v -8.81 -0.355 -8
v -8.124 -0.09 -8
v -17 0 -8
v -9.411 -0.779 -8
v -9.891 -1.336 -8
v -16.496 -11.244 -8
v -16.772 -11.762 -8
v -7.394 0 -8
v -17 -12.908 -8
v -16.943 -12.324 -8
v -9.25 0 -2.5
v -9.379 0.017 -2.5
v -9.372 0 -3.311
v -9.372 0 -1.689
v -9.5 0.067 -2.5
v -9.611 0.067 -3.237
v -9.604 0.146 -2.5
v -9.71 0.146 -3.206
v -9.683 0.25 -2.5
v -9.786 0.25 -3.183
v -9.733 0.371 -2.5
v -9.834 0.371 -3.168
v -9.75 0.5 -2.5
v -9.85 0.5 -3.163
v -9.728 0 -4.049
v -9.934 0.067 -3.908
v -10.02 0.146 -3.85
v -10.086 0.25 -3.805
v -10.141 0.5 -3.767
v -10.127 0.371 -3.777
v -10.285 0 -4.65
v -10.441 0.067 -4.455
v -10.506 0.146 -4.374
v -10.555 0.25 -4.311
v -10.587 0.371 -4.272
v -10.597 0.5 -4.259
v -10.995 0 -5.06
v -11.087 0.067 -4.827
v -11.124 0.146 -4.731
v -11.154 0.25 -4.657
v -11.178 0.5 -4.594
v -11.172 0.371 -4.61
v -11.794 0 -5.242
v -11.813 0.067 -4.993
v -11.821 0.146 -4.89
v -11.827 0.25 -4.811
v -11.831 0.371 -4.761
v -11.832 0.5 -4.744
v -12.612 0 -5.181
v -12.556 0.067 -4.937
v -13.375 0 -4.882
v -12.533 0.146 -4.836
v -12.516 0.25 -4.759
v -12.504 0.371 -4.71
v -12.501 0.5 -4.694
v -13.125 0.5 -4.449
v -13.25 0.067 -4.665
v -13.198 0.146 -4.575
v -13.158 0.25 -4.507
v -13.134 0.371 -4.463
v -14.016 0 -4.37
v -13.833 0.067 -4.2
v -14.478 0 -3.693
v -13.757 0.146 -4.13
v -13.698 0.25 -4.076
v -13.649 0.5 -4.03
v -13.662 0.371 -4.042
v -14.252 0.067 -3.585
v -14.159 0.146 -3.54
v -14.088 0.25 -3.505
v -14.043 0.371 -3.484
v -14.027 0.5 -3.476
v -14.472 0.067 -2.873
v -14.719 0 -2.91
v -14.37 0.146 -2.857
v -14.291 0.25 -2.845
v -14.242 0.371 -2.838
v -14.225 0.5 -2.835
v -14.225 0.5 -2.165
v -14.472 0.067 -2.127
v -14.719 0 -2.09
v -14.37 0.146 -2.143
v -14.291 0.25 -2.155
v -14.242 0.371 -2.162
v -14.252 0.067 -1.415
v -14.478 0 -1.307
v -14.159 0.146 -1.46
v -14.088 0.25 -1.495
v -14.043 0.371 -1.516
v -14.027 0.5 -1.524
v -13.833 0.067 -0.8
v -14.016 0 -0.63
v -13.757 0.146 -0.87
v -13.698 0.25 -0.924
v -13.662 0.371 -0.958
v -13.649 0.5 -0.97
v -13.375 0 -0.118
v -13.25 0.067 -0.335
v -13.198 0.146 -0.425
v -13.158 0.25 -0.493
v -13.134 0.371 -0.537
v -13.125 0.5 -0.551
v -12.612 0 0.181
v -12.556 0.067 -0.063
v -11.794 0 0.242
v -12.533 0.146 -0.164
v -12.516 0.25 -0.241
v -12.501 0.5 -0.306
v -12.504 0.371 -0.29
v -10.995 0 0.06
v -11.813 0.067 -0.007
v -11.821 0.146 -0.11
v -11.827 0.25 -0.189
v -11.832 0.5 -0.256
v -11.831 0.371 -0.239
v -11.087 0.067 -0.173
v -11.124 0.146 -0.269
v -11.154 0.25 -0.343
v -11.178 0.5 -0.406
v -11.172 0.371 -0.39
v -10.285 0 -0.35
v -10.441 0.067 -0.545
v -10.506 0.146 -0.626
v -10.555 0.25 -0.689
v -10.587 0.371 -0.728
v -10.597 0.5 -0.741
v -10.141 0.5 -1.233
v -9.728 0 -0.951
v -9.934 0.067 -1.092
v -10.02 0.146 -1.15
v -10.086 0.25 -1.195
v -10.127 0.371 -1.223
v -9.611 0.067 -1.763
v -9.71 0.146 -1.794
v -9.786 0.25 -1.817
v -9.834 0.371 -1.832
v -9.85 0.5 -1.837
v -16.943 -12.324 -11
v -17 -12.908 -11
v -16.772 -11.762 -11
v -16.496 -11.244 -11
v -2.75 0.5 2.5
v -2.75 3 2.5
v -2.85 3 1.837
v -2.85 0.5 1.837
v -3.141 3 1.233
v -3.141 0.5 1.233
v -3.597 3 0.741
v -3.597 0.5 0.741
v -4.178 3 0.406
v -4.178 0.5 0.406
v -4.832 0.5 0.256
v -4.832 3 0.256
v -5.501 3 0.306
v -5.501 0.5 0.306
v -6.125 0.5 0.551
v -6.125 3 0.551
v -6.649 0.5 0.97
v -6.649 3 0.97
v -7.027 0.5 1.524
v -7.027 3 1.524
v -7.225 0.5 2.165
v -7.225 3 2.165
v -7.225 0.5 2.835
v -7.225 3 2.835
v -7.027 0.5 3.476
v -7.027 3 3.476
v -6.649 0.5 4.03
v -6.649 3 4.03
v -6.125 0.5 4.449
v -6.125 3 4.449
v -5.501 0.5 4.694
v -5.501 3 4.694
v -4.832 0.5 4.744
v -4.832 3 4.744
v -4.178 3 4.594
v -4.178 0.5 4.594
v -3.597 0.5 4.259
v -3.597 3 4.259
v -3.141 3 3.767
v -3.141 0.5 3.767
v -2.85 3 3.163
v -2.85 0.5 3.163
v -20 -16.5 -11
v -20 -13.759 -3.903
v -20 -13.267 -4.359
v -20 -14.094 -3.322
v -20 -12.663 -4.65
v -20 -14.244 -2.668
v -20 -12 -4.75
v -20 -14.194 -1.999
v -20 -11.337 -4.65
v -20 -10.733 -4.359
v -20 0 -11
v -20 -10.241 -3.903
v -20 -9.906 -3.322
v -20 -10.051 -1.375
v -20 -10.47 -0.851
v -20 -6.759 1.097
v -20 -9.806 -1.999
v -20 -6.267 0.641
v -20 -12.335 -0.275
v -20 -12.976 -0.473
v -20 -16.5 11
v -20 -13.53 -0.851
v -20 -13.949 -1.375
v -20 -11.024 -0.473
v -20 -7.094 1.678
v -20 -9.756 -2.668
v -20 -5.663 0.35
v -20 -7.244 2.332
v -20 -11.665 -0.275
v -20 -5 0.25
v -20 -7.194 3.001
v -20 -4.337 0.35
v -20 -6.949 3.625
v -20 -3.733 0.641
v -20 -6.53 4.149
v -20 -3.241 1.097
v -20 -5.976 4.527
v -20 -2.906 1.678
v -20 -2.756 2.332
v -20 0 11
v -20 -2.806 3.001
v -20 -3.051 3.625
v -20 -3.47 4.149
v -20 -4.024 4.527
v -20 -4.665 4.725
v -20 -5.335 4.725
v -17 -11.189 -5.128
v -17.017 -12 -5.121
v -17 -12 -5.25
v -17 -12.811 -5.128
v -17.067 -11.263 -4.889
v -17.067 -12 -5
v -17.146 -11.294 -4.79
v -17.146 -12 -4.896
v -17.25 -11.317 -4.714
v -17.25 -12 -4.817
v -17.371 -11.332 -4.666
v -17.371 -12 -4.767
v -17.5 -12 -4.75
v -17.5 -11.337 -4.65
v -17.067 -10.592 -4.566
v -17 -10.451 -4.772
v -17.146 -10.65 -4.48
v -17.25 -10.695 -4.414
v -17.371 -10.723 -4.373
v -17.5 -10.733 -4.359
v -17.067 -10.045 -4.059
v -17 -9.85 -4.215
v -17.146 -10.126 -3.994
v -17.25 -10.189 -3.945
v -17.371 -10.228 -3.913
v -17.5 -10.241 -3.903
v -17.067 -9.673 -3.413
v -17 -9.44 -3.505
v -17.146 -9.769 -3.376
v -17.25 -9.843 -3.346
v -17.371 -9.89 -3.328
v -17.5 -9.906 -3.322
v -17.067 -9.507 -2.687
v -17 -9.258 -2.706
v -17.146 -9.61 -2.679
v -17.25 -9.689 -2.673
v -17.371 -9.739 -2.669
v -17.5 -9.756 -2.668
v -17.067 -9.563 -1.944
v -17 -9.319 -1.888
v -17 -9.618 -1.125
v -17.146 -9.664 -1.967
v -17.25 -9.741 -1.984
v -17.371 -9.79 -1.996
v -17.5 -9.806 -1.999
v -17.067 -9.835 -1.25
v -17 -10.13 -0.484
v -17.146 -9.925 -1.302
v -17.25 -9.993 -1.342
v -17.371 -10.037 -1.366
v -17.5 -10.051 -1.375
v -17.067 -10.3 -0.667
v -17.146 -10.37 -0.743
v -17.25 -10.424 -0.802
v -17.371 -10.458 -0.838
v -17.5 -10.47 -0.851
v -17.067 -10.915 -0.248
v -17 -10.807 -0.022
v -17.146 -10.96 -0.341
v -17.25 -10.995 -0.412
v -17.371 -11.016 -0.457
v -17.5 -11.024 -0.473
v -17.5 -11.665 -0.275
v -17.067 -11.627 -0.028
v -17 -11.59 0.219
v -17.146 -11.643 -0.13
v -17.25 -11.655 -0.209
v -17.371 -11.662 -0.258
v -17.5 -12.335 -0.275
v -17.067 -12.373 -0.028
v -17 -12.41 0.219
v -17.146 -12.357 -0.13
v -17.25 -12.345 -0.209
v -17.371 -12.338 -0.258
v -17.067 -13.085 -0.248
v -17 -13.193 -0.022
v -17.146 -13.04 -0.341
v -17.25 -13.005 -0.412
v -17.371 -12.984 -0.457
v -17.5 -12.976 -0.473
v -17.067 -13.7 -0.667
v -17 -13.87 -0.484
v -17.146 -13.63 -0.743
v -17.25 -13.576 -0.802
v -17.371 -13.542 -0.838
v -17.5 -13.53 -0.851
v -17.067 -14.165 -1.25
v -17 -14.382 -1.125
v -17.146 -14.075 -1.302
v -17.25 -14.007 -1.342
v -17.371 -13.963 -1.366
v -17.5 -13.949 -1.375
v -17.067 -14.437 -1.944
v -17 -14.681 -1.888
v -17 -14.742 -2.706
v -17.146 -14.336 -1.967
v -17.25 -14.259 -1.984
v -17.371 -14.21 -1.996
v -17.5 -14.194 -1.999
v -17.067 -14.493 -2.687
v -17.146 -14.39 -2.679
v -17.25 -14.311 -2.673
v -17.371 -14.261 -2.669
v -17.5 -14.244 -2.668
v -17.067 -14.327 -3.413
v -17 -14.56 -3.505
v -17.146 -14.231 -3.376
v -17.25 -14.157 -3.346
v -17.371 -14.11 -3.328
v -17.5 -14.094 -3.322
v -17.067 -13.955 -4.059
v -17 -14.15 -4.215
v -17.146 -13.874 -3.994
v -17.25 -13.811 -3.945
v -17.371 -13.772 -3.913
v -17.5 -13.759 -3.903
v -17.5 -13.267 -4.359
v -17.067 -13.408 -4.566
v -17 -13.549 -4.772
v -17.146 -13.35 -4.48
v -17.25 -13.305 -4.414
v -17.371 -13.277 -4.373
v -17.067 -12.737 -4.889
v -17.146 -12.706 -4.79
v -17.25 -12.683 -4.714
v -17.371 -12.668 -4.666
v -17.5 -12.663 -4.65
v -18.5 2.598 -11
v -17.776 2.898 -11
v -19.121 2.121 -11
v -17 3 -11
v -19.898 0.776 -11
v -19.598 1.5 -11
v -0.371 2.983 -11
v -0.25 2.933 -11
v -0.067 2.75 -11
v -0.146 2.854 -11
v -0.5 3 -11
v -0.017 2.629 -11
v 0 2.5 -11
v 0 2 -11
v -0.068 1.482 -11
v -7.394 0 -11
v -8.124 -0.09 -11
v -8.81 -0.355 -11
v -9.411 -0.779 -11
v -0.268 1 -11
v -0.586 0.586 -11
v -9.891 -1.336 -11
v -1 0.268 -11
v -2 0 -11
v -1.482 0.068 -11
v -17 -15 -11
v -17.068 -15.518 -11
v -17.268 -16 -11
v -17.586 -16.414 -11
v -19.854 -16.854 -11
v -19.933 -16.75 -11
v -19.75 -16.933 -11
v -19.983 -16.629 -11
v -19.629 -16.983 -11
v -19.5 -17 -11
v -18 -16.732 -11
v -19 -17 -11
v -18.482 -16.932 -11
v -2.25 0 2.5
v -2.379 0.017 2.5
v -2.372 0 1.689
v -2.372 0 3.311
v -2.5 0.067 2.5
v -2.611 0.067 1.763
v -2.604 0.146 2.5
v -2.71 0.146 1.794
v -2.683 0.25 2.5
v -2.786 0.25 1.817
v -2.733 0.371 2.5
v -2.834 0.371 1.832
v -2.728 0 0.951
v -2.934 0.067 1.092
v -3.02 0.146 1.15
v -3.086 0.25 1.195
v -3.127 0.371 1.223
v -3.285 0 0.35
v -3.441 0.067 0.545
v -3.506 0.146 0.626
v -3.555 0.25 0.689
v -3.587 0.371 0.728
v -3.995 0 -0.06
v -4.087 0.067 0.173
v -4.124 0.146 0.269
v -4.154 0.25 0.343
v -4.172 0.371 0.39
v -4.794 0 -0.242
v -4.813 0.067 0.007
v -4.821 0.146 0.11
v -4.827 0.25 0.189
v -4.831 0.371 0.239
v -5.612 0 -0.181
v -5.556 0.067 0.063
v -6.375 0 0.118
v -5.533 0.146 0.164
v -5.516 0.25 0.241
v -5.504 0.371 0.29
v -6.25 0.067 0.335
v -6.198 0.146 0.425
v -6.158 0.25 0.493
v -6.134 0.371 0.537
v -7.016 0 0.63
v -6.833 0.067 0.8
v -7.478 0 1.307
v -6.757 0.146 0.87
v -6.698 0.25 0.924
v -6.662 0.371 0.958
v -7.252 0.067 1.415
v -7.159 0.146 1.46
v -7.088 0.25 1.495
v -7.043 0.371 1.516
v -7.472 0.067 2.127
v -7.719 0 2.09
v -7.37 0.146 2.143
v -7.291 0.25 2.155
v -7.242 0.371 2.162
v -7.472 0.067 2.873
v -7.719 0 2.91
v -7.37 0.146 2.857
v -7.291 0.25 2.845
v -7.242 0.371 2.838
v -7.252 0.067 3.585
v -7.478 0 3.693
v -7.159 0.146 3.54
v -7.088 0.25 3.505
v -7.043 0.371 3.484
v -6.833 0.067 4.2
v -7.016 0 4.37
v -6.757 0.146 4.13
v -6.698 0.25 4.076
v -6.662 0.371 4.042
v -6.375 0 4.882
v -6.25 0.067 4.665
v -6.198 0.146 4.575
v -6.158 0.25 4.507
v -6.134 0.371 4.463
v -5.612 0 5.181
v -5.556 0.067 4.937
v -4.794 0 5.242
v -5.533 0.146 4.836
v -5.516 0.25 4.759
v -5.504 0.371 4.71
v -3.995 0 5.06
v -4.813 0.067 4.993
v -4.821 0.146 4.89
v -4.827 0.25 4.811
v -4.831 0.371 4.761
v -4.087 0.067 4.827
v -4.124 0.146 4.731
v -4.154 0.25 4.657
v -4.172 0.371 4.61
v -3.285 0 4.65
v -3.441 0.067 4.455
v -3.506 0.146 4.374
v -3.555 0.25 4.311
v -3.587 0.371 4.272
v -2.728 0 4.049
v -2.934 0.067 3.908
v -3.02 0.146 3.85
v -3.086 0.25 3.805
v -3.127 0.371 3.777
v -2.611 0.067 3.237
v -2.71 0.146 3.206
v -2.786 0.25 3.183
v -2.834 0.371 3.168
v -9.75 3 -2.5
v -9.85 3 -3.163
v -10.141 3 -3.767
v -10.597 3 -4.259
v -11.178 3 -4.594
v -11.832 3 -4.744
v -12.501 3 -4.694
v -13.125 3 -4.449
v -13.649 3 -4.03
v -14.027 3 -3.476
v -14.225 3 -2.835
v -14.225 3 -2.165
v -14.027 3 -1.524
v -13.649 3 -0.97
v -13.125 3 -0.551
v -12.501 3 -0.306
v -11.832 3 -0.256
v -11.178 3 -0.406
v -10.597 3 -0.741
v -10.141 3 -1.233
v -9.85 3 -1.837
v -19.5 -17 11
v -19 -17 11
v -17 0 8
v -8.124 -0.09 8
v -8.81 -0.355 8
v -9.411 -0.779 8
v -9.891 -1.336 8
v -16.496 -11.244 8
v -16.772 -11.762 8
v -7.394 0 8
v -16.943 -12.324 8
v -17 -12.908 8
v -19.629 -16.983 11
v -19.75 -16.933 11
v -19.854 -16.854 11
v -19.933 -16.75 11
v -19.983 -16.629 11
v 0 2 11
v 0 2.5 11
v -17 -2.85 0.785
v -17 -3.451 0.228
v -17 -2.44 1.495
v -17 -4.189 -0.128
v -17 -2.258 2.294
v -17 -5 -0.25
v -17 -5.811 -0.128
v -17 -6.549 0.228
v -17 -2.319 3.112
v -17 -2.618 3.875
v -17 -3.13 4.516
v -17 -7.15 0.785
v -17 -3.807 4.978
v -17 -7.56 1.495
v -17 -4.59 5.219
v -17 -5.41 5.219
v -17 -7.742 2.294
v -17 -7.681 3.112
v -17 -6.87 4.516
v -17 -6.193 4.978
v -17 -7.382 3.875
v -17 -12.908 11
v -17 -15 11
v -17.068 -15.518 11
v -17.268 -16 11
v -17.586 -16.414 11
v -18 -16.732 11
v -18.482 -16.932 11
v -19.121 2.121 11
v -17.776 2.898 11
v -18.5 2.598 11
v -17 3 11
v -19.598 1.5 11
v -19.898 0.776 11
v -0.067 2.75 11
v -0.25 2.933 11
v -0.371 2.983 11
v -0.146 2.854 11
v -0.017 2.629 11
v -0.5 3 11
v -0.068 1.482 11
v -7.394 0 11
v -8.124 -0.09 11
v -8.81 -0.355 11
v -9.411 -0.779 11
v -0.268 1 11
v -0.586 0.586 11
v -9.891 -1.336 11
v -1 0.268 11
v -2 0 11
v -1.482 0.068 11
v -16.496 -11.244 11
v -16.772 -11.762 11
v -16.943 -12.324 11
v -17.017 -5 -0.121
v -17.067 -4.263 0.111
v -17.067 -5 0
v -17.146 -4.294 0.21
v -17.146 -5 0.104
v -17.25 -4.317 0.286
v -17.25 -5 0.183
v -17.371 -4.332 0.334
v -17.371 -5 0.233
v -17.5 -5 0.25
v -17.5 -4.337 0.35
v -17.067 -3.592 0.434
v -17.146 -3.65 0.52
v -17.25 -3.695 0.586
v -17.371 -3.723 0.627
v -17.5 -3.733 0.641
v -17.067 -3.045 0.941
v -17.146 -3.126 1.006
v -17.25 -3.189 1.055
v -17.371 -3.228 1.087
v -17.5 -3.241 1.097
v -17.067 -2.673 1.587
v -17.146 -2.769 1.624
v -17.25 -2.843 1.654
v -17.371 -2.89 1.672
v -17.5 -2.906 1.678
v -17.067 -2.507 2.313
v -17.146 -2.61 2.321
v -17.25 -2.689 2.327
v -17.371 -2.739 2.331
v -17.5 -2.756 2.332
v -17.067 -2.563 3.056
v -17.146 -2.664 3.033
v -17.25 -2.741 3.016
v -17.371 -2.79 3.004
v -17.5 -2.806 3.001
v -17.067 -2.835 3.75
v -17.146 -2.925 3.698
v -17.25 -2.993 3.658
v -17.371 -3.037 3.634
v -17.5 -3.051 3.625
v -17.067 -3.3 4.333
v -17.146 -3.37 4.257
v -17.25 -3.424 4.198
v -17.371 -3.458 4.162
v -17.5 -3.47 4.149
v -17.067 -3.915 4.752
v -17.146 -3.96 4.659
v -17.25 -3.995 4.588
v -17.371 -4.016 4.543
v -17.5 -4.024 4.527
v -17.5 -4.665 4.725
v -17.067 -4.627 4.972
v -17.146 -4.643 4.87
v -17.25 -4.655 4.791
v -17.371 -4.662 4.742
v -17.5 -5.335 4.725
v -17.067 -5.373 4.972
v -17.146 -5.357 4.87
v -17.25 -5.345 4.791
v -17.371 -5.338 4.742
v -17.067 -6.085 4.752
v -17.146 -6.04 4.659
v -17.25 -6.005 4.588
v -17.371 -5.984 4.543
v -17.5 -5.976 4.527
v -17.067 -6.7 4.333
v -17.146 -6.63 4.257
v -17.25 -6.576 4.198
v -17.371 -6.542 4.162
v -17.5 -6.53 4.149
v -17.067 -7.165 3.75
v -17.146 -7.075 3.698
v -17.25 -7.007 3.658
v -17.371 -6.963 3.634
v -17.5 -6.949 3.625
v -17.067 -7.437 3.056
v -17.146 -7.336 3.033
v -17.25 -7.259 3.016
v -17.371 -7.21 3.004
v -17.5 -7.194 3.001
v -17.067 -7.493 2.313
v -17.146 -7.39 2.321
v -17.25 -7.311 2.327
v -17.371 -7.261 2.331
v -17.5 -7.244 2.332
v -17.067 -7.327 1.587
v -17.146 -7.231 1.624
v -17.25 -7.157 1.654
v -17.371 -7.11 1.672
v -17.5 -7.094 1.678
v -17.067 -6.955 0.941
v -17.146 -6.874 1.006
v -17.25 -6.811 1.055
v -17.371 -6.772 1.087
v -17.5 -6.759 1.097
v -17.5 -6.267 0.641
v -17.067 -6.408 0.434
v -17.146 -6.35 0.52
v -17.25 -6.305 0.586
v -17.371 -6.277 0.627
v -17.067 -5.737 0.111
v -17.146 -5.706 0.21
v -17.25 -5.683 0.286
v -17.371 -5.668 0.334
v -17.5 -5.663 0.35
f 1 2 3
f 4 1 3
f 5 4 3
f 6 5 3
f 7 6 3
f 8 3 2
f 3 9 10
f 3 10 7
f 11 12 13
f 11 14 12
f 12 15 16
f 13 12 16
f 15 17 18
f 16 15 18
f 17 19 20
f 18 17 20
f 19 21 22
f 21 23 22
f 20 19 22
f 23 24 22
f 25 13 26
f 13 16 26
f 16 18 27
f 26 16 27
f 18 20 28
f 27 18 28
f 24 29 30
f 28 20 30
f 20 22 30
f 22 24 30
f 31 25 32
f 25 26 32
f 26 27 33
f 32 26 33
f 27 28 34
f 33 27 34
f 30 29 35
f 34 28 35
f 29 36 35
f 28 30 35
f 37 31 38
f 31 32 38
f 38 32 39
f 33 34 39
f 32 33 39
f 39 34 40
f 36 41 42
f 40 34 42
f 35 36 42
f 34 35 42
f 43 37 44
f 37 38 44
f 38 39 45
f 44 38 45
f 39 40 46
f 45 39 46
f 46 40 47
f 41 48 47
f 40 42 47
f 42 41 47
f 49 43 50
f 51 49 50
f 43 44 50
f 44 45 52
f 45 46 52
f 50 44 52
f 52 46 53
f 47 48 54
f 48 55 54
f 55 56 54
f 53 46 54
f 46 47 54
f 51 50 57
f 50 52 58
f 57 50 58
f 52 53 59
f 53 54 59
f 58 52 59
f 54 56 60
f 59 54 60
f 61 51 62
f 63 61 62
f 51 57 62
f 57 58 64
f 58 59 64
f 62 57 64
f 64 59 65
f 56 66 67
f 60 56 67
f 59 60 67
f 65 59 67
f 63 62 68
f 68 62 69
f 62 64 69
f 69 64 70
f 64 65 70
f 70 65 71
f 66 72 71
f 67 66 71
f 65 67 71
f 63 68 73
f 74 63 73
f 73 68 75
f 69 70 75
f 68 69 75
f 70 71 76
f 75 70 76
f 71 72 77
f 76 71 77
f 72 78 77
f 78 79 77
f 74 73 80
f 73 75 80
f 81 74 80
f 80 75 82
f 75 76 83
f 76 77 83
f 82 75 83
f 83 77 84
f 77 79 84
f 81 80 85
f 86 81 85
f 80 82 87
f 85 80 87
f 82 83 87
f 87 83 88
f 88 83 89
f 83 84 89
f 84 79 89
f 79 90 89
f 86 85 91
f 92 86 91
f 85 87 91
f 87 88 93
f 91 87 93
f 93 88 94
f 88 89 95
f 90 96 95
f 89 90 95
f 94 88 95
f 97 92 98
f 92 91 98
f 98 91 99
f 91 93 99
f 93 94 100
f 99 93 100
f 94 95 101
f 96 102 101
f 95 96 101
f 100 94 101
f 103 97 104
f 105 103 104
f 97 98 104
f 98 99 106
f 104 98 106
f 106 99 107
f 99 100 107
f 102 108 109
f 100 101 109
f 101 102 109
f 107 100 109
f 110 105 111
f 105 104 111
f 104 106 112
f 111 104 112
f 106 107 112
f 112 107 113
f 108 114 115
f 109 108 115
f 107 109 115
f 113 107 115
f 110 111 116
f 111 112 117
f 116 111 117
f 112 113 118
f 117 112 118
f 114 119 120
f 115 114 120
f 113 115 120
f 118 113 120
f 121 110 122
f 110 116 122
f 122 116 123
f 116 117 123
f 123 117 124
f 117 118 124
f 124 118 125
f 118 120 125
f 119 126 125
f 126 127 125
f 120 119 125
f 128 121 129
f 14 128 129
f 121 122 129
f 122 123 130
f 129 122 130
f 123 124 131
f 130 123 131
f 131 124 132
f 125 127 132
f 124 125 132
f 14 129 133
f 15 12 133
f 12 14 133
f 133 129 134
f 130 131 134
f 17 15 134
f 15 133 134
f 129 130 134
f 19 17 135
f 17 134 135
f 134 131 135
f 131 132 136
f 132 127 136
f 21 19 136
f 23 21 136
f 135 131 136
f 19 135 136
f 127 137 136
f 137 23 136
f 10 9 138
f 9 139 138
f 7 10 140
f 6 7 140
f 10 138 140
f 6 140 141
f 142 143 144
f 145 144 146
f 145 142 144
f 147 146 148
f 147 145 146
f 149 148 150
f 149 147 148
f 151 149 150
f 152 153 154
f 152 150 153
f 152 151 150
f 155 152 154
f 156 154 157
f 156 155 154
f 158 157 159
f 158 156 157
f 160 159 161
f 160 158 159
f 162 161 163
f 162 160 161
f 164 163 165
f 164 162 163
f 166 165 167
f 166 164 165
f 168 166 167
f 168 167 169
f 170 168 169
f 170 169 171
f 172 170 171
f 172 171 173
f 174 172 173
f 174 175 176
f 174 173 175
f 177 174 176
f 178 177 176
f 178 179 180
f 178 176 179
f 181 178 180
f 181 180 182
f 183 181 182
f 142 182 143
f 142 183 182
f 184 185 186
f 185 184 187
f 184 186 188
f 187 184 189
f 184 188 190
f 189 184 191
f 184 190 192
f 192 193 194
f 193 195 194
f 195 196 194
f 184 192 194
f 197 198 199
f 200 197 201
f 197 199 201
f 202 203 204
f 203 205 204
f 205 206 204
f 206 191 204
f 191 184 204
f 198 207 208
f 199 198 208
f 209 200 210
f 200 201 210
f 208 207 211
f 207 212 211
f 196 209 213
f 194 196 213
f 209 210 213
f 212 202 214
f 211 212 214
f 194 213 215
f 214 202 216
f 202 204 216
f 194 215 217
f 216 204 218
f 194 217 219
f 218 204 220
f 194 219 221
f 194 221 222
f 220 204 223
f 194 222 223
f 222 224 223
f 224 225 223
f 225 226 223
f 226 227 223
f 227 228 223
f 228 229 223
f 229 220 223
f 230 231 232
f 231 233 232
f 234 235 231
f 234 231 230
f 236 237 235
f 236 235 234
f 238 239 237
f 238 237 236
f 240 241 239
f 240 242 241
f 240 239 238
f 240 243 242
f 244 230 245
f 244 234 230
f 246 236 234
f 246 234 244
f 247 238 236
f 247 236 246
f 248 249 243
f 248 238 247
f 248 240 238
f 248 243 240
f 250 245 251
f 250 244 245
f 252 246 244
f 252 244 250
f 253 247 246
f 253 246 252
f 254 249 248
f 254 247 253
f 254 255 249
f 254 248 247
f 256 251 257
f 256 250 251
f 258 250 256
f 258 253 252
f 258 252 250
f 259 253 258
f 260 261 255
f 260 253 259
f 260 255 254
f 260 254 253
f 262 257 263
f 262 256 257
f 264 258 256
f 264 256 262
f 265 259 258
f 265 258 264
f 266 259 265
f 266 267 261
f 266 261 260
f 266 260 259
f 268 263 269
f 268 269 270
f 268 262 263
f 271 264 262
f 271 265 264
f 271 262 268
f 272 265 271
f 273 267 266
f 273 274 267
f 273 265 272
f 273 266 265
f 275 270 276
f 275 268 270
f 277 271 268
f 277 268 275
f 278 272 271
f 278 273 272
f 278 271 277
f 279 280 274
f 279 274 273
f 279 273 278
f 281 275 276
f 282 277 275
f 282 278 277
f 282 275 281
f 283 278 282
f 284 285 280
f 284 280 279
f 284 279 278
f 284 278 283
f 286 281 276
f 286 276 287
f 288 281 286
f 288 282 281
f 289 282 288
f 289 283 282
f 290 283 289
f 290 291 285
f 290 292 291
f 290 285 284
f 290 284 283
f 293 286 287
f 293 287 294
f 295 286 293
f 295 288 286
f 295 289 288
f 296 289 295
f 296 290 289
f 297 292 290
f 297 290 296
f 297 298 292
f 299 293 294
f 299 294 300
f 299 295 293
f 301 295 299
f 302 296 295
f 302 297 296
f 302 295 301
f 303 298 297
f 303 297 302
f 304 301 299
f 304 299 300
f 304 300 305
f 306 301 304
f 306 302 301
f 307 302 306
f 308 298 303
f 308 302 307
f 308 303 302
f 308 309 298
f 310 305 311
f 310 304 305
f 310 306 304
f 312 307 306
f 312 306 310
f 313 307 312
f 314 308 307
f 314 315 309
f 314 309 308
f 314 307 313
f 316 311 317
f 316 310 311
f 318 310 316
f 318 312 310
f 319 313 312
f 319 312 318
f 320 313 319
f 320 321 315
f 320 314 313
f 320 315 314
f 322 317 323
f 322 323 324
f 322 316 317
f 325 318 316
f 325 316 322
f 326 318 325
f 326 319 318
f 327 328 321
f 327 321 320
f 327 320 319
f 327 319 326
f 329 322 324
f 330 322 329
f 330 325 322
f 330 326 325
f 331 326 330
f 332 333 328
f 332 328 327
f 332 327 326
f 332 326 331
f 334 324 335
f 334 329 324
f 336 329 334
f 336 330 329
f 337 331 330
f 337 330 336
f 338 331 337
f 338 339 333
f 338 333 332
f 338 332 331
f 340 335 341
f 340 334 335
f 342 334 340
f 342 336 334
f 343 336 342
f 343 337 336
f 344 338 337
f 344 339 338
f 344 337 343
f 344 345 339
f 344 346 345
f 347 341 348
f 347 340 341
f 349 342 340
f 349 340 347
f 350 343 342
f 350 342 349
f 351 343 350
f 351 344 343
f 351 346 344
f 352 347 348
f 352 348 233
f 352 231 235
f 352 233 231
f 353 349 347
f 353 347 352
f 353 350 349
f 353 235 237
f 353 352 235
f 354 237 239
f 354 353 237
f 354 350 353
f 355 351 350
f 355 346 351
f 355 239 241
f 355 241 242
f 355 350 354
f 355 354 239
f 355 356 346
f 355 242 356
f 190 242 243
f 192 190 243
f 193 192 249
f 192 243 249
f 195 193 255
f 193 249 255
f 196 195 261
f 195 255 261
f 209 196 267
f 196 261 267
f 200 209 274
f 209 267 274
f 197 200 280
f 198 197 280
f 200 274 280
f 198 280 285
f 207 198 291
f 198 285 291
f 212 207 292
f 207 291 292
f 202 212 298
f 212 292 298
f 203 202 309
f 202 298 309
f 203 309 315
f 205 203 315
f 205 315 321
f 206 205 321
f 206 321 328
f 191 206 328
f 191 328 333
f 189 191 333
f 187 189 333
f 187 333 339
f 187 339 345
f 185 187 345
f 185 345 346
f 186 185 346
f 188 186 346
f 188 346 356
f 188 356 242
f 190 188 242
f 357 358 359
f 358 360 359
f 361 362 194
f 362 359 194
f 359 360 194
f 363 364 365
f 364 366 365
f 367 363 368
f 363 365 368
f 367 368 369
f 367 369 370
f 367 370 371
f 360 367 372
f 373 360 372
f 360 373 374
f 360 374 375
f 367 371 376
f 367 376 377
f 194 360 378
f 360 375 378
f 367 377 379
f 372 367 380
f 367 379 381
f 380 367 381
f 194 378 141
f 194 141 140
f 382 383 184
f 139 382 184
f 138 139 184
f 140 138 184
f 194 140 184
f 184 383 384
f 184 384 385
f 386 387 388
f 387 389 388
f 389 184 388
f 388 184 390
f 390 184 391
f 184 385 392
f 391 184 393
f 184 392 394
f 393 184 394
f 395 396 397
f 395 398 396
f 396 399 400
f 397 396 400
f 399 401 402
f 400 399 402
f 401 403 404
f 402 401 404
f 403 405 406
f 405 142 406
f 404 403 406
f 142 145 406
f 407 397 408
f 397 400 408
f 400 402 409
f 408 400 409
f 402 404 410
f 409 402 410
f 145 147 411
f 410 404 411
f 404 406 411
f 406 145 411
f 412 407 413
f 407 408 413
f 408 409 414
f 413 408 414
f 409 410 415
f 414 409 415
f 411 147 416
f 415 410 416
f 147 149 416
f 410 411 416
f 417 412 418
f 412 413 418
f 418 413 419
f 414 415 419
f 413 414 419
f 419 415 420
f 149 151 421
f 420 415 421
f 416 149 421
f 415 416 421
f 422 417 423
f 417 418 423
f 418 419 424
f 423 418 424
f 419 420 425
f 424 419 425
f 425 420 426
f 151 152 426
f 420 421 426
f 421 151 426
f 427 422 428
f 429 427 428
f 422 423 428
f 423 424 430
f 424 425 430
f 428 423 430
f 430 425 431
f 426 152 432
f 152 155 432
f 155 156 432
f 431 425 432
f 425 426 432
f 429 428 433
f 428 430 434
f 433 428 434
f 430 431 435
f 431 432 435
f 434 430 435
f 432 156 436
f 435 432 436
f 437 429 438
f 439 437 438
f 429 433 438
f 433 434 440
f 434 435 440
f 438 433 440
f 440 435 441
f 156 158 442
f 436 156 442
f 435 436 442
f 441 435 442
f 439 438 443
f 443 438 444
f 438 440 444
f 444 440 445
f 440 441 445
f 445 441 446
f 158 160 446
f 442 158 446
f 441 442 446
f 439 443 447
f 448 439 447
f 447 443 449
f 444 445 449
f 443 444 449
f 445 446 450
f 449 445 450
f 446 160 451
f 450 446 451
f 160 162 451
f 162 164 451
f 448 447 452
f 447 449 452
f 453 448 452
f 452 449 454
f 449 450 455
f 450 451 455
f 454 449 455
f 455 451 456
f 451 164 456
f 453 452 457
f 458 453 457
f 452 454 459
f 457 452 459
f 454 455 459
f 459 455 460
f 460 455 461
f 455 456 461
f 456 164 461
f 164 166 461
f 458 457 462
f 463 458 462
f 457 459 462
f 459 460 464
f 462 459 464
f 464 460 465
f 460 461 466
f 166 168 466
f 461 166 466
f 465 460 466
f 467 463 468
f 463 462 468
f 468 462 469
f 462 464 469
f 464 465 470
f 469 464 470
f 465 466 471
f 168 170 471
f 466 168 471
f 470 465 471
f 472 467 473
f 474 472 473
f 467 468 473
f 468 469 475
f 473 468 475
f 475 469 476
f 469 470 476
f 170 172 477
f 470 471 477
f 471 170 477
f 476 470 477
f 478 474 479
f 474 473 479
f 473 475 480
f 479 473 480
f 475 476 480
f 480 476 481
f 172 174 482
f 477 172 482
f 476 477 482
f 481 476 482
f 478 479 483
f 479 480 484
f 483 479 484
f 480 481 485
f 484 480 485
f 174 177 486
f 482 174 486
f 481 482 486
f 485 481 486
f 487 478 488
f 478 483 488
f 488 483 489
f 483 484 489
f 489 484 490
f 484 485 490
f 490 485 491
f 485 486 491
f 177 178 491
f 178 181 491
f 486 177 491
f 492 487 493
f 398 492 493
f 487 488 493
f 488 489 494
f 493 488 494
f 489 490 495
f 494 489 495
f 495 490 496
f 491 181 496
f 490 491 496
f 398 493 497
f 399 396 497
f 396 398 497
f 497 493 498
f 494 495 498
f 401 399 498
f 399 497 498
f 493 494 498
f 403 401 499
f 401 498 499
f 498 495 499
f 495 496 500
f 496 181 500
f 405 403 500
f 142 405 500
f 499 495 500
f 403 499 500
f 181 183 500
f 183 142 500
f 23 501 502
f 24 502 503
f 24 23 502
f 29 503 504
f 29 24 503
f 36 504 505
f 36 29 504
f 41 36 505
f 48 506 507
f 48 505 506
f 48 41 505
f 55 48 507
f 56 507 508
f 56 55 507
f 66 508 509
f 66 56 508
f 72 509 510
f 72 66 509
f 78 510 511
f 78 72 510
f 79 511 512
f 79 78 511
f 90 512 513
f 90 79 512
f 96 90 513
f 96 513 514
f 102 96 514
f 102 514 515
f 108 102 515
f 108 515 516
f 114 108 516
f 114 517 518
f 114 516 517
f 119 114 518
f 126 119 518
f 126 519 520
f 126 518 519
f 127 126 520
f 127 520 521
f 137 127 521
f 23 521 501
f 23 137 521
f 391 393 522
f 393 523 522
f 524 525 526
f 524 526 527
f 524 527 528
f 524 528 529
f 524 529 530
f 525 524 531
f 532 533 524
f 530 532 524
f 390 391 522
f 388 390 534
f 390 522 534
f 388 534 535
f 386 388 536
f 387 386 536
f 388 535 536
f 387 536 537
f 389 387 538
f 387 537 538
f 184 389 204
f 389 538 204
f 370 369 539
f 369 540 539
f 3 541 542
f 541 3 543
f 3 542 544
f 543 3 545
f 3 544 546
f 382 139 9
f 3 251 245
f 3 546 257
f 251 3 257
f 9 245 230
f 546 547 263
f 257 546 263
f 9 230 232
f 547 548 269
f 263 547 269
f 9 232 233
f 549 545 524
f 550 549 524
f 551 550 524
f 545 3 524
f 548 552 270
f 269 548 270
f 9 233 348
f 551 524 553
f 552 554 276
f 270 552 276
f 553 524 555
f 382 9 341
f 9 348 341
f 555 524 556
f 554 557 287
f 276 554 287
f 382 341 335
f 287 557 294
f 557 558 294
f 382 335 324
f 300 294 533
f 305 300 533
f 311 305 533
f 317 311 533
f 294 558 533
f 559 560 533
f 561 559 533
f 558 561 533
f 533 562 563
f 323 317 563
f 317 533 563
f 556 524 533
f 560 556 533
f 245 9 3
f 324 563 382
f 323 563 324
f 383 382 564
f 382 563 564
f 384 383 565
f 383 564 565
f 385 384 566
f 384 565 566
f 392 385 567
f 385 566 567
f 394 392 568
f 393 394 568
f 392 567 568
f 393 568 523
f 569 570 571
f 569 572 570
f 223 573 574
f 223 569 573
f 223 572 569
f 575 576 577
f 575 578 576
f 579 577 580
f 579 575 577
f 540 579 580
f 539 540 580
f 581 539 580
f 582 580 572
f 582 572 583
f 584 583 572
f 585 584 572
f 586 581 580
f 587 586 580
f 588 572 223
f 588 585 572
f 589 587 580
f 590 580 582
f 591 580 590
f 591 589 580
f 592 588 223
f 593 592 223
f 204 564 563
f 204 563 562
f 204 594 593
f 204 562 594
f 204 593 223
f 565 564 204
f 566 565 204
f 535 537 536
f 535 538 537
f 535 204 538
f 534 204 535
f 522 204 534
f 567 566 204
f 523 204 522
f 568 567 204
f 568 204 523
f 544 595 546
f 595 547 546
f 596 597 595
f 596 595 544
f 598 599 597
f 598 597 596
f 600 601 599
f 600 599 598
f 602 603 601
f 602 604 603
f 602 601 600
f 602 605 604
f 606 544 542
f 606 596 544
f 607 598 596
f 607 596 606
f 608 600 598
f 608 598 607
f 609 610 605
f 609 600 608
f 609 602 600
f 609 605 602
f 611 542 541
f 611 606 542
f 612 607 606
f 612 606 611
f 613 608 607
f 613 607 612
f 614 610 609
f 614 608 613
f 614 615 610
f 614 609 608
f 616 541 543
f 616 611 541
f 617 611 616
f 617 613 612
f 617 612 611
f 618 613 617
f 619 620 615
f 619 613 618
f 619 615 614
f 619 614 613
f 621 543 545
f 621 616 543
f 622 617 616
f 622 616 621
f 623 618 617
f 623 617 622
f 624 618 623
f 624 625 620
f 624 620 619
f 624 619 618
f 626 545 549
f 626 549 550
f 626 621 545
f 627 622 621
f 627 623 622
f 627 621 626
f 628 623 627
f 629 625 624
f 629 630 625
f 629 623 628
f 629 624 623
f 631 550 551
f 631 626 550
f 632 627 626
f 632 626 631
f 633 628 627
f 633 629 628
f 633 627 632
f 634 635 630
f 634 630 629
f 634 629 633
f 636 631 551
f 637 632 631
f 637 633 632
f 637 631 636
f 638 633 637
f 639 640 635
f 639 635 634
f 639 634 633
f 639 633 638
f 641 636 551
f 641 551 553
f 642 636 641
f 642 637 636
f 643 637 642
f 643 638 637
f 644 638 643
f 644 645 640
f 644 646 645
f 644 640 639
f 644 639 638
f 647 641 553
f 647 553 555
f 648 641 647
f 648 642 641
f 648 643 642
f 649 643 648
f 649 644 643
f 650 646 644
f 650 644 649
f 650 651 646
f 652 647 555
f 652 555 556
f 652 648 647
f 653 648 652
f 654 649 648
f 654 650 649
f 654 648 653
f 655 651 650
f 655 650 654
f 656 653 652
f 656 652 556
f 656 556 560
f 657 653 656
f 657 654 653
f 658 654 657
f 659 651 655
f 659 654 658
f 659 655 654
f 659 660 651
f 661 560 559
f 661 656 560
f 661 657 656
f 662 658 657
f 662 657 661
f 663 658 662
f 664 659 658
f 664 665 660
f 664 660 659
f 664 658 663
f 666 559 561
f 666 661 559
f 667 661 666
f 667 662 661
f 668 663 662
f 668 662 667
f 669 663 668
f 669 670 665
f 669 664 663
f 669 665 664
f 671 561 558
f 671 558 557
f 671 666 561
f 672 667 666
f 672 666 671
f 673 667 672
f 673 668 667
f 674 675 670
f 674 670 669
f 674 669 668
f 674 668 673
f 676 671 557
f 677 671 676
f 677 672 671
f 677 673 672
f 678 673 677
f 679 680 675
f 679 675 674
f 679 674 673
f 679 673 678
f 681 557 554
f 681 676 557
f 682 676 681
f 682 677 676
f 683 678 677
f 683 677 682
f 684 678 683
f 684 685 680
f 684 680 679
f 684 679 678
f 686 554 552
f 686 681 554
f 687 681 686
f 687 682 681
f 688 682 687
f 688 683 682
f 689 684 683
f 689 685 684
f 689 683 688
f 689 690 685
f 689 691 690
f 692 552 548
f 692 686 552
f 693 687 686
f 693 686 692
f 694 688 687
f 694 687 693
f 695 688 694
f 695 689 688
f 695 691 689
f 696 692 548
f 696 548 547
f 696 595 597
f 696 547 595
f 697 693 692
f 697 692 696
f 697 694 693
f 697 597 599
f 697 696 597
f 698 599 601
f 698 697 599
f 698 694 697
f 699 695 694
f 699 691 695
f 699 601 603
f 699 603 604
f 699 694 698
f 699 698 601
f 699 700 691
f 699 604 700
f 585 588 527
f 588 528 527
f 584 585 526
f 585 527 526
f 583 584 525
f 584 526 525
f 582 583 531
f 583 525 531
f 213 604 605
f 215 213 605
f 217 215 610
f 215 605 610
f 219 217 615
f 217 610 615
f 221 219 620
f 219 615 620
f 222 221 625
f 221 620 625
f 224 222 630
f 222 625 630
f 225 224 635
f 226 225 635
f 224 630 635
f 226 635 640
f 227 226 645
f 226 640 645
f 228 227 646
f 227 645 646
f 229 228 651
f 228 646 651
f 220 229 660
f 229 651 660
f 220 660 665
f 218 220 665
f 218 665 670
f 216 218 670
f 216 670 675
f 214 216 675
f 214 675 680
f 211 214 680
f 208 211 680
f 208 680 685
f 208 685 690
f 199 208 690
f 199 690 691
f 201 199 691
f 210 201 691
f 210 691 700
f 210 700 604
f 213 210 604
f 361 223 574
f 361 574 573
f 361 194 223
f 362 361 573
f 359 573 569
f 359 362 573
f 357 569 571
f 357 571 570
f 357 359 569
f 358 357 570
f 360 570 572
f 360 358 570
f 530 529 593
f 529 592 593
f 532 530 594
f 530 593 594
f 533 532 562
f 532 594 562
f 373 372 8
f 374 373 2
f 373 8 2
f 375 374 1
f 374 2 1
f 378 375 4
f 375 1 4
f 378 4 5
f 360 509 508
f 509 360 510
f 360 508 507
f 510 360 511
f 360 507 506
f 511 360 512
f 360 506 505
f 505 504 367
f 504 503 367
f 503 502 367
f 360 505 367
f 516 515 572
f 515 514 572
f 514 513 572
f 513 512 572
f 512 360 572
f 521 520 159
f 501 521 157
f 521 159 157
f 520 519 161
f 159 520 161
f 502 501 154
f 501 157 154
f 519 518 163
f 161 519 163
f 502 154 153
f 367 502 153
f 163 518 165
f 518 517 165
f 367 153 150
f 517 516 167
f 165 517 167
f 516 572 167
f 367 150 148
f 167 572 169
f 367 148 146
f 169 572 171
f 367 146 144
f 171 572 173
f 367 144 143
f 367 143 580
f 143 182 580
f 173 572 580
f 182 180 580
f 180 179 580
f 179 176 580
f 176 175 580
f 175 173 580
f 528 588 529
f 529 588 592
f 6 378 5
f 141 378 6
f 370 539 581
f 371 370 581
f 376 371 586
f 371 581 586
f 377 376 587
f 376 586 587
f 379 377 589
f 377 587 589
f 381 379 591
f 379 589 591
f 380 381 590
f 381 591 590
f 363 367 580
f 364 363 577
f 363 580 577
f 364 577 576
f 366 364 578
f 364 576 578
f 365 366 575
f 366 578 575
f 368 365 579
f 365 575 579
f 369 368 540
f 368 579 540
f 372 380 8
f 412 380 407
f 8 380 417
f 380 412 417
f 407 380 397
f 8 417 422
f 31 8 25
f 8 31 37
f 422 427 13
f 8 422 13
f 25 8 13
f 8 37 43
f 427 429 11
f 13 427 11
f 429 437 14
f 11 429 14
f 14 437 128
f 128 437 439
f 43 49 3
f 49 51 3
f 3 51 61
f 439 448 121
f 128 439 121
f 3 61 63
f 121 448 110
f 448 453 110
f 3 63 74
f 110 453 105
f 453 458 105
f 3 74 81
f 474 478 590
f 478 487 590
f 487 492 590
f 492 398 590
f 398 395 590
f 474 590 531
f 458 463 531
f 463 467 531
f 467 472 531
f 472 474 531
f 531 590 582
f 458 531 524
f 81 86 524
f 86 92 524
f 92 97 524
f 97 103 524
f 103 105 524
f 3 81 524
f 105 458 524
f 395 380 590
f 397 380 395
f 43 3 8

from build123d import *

# Parameters (mm, degrees)
EXTRUDE_1_DEPTH     = 11
SKETCH_4_R          = 2.25
CUT_EXTRUDE_1_DEPTH = 10
SKETCH_2_R          = 2.25
CUT_EXTRUDE_2_DEPTH = 20
FILLET_2_R          = 0.5
RIB_2_REACH         = 36.249
SKETCH_5_WALL_W     = 84.92038026
SKETCH_5_WALL_H     = 3
RIB_3_REACH         = 36.249
SKETCH_6_WALL_W     = 84.92038026
SKETCH_6_WALL_H     = 3
FILLET_3_R          = 3


with BuildPart() as part:
    # 草图1 → 凸台-拉伸1 (new, symmetric)
    with BuildSketch(Plane.XY):
        with BuildLine():
            Line((-17, 0), (-17, -15))
            ThreePointArc((-17, -15), (-17.585786438, -16.414213562), (-19, -17))
            Line((-19, -17), (-19.5, -17))
            ThreePointArc((-19.5, -17), (-19.853553391, -16.853553391), (-20, -16.5))
            Line((-20, -16.5), (-20, 3))
            Line((-20, 3), (-0.5, 3))
            ThreePointArc((-0.5, 3), (-0.146446609, 2.853553391), (0, 2.5))
            Line((0, 2.5), (0, 2))
            ThreePointArc((0, 2), (-0.585786438, 0.585786438), (-2, 0))
            Line((-2, 0), (-17, 0))
        make_face()
    extrude(amount=EXTRUDE_1_DEPTH, both=True)

    # 草图4 → 切除-拉伸1 (cut)
    with BuildSketch(Plane(origin=(0, 0, 0), x_dir=(1, 0, 0), z_dir=(0, 1, 0))):
        with Locations((-5, -2.5)):
            Circle(SKETCH_4_R)
        with Locations((-12, 2.5)):
            Circle(SKETCH_4_R)
    extrude(amount=CUT_EXTRUDE_1_DEPTH, mode=Mode.SUBTRACT)

    # 草图2 → 切除-拉伸2 (cut)
    with BuildSketch(Plane(origin=(-17, 0, 0), x_dir=(0, 0, -1), z_dir=(1, 0, 0))):
        with Locations((2.5, -12)):
            Circle(SKETCH_2_R)
        with Locations((-2.5, -5)):
            Circle(SKETCH_2_R)
    extrude(amount=-CUT_EXTRUDE_2_DEPTH, mode=Mode.SUBTRACT)

    # 圆角2
    fillet_2_edges = [part.edges().sort_by_distance(p)[0] for p in [
        (-7.25, 0, 2.5),
        (-14.25, 0, -2.5),
        (-17, -12, -0.25),
        (-17, -5, 4.75),
    ]]
    fillet(fillet_2_edges, radius=FILLET_2_R)

    # 草图5 wall → 筋2 (add, up to next)
    with BuildSketch(Plane(origin=(-13, -6, -11), x_dir=(-0.554700196225, -0.832050294338, 0), z_dir=(0.832050294338, -0.554700196225, 0)), mode=Mode.PRIVATE) as rib_2_sk1:
        with Locations((0, -1.5)):
            Rectangle(SKETCH_5_WALL_W, SKETCH_5_WALL_H)
    rib_2_tool1 = extrude(rib_2_sk1.sketch, amount=-RIB_2_REACH, mode=Mode.PRIVATE) - part.part
    add(rib_2_tool1.solids().sort_by_distance((-13, -6, -11))[0])

    # 草图6 wall → 筋3 (add, up to next)
    with BuildSketch(Plane(origin=(-13, -6, 11), x_dir=(-0.554700196225, -0.832050294338, 0), z_dir=(-0.832050294338, 0.554700196225, 0)), mode=Mode.PRIVATE) as rib_3_sk1:
        with Locations((0, -1.5)):
            Rectangle(SKETCH_6_WALL_W, SKETCH_6_WALL_H)
    rib_3_tool1 = extrude(rib_3_sk1.sketch, amount=RIB_3_REACH, mode=Mode.PRIVATE) - part.part
    add(rib_3_tool1.solids().sort_by_distance((-13, -6, 11))[0])

    # 圆角3
    fillet_3_edges = [part.edges().sort_by_distance(p)[0] for p in [
        (-20, 3, 0),
        (-17, -12, -9.5),
        (-9, 0, -9.5),
        (-17, -12, 9.5),
        (-9, 0, 9.5),
    ]]
    fillet(fillet_3_edges, radius=FILLET_3_R)


solid = part.part
